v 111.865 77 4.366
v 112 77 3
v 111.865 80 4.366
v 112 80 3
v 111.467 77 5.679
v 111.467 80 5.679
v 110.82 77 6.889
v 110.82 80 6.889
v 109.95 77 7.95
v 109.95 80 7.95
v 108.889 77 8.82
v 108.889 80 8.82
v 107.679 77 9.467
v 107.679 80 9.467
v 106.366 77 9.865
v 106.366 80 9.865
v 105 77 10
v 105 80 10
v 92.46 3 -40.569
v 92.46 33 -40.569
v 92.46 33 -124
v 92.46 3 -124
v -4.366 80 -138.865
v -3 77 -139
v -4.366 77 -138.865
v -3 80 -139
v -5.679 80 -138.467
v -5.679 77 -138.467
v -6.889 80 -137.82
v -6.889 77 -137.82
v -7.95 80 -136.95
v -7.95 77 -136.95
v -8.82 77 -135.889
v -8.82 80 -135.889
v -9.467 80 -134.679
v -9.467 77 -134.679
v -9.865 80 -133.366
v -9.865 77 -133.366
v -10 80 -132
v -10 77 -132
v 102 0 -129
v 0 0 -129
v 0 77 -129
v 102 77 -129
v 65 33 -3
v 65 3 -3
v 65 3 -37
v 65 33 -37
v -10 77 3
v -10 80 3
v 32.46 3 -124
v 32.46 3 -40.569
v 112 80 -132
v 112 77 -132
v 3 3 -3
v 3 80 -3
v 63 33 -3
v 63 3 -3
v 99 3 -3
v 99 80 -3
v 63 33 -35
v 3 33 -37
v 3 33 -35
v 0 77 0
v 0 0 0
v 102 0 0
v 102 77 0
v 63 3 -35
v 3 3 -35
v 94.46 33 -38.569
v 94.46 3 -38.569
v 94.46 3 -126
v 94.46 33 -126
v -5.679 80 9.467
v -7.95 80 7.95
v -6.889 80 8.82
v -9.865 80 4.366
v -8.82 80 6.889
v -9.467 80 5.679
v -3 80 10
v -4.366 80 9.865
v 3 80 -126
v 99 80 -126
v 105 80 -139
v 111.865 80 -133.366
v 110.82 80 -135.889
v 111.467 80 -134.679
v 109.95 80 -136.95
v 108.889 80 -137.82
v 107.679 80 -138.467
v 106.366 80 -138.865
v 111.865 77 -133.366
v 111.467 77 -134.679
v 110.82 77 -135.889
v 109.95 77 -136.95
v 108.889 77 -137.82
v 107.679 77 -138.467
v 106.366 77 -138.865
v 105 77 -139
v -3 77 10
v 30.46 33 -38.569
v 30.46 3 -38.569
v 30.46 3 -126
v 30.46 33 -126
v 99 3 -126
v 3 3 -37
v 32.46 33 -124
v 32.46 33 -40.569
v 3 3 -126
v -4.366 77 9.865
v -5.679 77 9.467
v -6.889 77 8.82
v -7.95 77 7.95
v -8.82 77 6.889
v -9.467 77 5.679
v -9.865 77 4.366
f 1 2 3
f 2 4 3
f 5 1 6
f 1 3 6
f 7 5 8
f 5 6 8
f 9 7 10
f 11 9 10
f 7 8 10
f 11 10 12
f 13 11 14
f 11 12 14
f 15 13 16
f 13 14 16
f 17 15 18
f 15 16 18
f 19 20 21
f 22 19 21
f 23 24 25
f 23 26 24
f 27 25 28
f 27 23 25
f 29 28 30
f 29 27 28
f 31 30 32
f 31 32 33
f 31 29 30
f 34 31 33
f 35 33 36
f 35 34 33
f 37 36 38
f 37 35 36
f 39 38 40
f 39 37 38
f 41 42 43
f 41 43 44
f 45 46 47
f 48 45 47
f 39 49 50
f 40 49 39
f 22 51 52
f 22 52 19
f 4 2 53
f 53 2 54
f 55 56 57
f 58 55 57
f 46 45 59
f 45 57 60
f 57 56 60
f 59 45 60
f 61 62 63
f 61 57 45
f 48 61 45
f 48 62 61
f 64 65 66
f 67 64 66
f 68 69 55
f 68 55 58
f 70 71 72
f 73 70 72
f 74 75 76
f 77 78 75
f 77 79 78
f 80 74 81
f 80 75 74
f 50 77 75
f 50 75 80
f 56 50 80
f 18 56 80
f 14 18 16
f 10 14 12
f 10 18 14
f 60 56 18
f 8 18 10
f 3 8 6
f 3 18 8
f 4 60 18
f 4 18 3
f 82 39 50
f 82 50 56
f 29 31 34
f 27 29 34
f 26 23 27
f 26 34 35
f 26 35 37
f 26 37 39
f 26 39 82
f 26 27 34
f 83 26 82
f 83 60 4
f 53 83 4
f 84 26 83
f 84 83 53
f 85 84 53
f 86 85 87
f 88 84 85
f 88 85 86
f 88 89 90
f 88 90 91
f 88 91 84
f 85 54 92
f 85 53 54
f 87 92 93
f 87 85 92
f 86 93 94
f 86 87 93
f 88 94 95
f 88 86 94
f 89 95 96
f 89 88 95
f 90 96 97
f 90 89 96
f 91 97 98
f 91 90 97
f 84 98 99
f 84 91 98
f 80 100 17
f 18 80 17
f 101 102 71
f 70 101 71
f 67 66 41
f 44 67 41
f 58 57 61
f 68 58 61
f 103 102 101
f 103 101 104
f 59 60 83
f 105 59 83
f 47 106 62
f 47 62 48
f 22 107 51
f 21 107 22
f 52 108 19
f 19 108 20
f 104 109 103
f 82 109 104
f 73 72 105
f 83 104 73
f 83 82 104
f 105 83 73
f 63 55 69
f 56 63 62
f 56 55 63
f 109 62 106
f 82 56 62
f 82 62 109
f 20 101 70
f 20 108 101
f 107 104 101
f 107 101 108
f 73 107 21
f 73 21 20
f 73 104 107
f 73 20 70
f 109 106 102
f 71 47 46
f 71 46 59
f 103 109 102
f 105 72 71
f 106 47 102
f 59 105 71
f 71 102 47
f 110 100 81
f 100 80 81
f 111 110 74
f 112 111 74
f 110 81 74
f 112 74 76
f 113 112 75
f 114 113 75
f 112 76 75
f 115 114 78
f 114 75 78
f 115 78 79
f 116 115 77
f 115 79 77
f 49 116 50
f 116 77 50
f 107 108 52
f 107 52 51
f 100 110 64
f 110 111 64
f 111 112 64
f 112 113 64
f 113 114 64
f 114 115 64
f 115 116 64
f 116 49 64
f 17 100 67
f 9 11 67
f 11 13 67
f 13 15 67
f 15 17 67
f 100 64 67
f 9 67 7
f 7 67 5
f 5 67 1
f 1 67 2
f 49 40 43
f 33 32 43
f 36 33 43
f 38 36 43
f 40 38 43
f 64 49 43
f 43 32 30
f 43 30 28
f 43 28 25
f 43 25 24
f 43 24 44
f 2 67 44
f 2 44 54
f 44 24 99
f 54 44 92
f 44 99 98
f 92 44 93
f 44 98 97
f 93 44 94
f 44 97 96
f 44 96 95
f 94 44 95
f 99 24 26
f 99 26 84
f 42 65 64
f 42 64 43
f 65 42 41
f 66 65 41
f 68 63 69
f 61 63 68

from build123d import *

# Parameters (mm, degrees)
SKETCH1_W           = 102
SKETCH1_H           = 129
BOSS_EXTRUDE1_DEPTH = 77
SKETCH2_W           = 122
SKETCH2_H           = 149
BOSS_EXTRUDE2_DEPTH = 3
SKETCH3_W           = 96
SKETCH3_H           = 123
CUT_EXTRUDE1_DEPTH  = 77
SKETCH4_W           = 64
SKETCH4_H           = 89
SKETCH4_W_2         = 62
SKETCH4_H_2         = 34
BOSS_EXTRUDE3_DEPTH = 30
SKETCH5_W           = 60
SKETCH5_H           = 83.431405536
SKETCH5_H_2         = 32
CUT_EXTRUDE2_DEPTH  = 30
FILLET1_R           = 7


with BuildPart() as part:
    # Sketch1 → Boss-Extrude1 (new body)
    with BuildSketch(Plane(origin=(0, 0, 0), x_dir=(1, 0, 0), z_dir=(0, 1, 0))):
        with Locations((51, 64.5)):
            Rectangle(SKETCH1_W, SKETCH1_H)
    extrude(amount=BOSS_EXTRUDE1_DEPTH)

    # Sketch2 → Boss-Extrude2 (add)
    with BuildSketch(Plane(origin=(0, 77, 0), x_dir=(1, 0, 0), z_dir=(0, 1, 0))):
        with Locations((51, 64.5)):
            Rectangle(SKETCH2_W, SKETCH2_H)
    extrude(amount=BOSS_EXTRUDE2_DEPTH)

    # Sketch3 → Cut-Extrude1 (cut)
    with BuildSketch(Plane(origin=(0, 80, 0), x_dir=(1, 0, 0), z_dir=(0, 1, 0))):
        with Locations((51, 64.5)):
            Rectangle(SKETCH3_W, SKETCH3_H)
    extrude(amount=-CUT_EXTRUDE1_DEPTH, mode=Mode.SUBTRACT)

    # Sketch4 → Boss-Extrude3 (add)
    with BuildSketch(Plane(origin=(0, 3, 0), x_dir=(1, 0, 0), z_dir=(0, 1, 0))):
        with Locations((62.459815843, 83.068594464)):
            Rectangle(SKETCH4_W, SKETCH4_H)
        with Locations((34, 20)):
            Rectangle(SKETCH4_W_2, SKETCH4_H_2)
    extrude(amount=BOSS_EXTRUDE3_DEPTH)

    # Sketch5 → Cut-Extrude2 (cut)
    with BuildSketch(Plane(origin=(0, 33, 0), x_dir=(1, 0, 0), z_dir=(0, 1, 0))):
        with Locations((62.459815843, 82.284297232)):
            Rectangle(SKETCH5_W, SKETCH5_H)
        with Locations((33, 19)):
            Rectangle(SKETCH5_W, SKETCH5_H_2)
    extrude(amount=-CUT_EXTRUDE2_DEPTH, mode=Mode.SUBTRACT)

    # Fillet1
    fillet1_edges = [part.edges().sort_by_distance(p)[0] for p in [
        (-10, 78.5, -139),
        (-10, 78.5, 10),
        (112, 78.5, 10),
        (112, 78.5, -139),
    ]]
    fillet(fillet1_edges, radius=FILLET1_R)


solid = part.part
